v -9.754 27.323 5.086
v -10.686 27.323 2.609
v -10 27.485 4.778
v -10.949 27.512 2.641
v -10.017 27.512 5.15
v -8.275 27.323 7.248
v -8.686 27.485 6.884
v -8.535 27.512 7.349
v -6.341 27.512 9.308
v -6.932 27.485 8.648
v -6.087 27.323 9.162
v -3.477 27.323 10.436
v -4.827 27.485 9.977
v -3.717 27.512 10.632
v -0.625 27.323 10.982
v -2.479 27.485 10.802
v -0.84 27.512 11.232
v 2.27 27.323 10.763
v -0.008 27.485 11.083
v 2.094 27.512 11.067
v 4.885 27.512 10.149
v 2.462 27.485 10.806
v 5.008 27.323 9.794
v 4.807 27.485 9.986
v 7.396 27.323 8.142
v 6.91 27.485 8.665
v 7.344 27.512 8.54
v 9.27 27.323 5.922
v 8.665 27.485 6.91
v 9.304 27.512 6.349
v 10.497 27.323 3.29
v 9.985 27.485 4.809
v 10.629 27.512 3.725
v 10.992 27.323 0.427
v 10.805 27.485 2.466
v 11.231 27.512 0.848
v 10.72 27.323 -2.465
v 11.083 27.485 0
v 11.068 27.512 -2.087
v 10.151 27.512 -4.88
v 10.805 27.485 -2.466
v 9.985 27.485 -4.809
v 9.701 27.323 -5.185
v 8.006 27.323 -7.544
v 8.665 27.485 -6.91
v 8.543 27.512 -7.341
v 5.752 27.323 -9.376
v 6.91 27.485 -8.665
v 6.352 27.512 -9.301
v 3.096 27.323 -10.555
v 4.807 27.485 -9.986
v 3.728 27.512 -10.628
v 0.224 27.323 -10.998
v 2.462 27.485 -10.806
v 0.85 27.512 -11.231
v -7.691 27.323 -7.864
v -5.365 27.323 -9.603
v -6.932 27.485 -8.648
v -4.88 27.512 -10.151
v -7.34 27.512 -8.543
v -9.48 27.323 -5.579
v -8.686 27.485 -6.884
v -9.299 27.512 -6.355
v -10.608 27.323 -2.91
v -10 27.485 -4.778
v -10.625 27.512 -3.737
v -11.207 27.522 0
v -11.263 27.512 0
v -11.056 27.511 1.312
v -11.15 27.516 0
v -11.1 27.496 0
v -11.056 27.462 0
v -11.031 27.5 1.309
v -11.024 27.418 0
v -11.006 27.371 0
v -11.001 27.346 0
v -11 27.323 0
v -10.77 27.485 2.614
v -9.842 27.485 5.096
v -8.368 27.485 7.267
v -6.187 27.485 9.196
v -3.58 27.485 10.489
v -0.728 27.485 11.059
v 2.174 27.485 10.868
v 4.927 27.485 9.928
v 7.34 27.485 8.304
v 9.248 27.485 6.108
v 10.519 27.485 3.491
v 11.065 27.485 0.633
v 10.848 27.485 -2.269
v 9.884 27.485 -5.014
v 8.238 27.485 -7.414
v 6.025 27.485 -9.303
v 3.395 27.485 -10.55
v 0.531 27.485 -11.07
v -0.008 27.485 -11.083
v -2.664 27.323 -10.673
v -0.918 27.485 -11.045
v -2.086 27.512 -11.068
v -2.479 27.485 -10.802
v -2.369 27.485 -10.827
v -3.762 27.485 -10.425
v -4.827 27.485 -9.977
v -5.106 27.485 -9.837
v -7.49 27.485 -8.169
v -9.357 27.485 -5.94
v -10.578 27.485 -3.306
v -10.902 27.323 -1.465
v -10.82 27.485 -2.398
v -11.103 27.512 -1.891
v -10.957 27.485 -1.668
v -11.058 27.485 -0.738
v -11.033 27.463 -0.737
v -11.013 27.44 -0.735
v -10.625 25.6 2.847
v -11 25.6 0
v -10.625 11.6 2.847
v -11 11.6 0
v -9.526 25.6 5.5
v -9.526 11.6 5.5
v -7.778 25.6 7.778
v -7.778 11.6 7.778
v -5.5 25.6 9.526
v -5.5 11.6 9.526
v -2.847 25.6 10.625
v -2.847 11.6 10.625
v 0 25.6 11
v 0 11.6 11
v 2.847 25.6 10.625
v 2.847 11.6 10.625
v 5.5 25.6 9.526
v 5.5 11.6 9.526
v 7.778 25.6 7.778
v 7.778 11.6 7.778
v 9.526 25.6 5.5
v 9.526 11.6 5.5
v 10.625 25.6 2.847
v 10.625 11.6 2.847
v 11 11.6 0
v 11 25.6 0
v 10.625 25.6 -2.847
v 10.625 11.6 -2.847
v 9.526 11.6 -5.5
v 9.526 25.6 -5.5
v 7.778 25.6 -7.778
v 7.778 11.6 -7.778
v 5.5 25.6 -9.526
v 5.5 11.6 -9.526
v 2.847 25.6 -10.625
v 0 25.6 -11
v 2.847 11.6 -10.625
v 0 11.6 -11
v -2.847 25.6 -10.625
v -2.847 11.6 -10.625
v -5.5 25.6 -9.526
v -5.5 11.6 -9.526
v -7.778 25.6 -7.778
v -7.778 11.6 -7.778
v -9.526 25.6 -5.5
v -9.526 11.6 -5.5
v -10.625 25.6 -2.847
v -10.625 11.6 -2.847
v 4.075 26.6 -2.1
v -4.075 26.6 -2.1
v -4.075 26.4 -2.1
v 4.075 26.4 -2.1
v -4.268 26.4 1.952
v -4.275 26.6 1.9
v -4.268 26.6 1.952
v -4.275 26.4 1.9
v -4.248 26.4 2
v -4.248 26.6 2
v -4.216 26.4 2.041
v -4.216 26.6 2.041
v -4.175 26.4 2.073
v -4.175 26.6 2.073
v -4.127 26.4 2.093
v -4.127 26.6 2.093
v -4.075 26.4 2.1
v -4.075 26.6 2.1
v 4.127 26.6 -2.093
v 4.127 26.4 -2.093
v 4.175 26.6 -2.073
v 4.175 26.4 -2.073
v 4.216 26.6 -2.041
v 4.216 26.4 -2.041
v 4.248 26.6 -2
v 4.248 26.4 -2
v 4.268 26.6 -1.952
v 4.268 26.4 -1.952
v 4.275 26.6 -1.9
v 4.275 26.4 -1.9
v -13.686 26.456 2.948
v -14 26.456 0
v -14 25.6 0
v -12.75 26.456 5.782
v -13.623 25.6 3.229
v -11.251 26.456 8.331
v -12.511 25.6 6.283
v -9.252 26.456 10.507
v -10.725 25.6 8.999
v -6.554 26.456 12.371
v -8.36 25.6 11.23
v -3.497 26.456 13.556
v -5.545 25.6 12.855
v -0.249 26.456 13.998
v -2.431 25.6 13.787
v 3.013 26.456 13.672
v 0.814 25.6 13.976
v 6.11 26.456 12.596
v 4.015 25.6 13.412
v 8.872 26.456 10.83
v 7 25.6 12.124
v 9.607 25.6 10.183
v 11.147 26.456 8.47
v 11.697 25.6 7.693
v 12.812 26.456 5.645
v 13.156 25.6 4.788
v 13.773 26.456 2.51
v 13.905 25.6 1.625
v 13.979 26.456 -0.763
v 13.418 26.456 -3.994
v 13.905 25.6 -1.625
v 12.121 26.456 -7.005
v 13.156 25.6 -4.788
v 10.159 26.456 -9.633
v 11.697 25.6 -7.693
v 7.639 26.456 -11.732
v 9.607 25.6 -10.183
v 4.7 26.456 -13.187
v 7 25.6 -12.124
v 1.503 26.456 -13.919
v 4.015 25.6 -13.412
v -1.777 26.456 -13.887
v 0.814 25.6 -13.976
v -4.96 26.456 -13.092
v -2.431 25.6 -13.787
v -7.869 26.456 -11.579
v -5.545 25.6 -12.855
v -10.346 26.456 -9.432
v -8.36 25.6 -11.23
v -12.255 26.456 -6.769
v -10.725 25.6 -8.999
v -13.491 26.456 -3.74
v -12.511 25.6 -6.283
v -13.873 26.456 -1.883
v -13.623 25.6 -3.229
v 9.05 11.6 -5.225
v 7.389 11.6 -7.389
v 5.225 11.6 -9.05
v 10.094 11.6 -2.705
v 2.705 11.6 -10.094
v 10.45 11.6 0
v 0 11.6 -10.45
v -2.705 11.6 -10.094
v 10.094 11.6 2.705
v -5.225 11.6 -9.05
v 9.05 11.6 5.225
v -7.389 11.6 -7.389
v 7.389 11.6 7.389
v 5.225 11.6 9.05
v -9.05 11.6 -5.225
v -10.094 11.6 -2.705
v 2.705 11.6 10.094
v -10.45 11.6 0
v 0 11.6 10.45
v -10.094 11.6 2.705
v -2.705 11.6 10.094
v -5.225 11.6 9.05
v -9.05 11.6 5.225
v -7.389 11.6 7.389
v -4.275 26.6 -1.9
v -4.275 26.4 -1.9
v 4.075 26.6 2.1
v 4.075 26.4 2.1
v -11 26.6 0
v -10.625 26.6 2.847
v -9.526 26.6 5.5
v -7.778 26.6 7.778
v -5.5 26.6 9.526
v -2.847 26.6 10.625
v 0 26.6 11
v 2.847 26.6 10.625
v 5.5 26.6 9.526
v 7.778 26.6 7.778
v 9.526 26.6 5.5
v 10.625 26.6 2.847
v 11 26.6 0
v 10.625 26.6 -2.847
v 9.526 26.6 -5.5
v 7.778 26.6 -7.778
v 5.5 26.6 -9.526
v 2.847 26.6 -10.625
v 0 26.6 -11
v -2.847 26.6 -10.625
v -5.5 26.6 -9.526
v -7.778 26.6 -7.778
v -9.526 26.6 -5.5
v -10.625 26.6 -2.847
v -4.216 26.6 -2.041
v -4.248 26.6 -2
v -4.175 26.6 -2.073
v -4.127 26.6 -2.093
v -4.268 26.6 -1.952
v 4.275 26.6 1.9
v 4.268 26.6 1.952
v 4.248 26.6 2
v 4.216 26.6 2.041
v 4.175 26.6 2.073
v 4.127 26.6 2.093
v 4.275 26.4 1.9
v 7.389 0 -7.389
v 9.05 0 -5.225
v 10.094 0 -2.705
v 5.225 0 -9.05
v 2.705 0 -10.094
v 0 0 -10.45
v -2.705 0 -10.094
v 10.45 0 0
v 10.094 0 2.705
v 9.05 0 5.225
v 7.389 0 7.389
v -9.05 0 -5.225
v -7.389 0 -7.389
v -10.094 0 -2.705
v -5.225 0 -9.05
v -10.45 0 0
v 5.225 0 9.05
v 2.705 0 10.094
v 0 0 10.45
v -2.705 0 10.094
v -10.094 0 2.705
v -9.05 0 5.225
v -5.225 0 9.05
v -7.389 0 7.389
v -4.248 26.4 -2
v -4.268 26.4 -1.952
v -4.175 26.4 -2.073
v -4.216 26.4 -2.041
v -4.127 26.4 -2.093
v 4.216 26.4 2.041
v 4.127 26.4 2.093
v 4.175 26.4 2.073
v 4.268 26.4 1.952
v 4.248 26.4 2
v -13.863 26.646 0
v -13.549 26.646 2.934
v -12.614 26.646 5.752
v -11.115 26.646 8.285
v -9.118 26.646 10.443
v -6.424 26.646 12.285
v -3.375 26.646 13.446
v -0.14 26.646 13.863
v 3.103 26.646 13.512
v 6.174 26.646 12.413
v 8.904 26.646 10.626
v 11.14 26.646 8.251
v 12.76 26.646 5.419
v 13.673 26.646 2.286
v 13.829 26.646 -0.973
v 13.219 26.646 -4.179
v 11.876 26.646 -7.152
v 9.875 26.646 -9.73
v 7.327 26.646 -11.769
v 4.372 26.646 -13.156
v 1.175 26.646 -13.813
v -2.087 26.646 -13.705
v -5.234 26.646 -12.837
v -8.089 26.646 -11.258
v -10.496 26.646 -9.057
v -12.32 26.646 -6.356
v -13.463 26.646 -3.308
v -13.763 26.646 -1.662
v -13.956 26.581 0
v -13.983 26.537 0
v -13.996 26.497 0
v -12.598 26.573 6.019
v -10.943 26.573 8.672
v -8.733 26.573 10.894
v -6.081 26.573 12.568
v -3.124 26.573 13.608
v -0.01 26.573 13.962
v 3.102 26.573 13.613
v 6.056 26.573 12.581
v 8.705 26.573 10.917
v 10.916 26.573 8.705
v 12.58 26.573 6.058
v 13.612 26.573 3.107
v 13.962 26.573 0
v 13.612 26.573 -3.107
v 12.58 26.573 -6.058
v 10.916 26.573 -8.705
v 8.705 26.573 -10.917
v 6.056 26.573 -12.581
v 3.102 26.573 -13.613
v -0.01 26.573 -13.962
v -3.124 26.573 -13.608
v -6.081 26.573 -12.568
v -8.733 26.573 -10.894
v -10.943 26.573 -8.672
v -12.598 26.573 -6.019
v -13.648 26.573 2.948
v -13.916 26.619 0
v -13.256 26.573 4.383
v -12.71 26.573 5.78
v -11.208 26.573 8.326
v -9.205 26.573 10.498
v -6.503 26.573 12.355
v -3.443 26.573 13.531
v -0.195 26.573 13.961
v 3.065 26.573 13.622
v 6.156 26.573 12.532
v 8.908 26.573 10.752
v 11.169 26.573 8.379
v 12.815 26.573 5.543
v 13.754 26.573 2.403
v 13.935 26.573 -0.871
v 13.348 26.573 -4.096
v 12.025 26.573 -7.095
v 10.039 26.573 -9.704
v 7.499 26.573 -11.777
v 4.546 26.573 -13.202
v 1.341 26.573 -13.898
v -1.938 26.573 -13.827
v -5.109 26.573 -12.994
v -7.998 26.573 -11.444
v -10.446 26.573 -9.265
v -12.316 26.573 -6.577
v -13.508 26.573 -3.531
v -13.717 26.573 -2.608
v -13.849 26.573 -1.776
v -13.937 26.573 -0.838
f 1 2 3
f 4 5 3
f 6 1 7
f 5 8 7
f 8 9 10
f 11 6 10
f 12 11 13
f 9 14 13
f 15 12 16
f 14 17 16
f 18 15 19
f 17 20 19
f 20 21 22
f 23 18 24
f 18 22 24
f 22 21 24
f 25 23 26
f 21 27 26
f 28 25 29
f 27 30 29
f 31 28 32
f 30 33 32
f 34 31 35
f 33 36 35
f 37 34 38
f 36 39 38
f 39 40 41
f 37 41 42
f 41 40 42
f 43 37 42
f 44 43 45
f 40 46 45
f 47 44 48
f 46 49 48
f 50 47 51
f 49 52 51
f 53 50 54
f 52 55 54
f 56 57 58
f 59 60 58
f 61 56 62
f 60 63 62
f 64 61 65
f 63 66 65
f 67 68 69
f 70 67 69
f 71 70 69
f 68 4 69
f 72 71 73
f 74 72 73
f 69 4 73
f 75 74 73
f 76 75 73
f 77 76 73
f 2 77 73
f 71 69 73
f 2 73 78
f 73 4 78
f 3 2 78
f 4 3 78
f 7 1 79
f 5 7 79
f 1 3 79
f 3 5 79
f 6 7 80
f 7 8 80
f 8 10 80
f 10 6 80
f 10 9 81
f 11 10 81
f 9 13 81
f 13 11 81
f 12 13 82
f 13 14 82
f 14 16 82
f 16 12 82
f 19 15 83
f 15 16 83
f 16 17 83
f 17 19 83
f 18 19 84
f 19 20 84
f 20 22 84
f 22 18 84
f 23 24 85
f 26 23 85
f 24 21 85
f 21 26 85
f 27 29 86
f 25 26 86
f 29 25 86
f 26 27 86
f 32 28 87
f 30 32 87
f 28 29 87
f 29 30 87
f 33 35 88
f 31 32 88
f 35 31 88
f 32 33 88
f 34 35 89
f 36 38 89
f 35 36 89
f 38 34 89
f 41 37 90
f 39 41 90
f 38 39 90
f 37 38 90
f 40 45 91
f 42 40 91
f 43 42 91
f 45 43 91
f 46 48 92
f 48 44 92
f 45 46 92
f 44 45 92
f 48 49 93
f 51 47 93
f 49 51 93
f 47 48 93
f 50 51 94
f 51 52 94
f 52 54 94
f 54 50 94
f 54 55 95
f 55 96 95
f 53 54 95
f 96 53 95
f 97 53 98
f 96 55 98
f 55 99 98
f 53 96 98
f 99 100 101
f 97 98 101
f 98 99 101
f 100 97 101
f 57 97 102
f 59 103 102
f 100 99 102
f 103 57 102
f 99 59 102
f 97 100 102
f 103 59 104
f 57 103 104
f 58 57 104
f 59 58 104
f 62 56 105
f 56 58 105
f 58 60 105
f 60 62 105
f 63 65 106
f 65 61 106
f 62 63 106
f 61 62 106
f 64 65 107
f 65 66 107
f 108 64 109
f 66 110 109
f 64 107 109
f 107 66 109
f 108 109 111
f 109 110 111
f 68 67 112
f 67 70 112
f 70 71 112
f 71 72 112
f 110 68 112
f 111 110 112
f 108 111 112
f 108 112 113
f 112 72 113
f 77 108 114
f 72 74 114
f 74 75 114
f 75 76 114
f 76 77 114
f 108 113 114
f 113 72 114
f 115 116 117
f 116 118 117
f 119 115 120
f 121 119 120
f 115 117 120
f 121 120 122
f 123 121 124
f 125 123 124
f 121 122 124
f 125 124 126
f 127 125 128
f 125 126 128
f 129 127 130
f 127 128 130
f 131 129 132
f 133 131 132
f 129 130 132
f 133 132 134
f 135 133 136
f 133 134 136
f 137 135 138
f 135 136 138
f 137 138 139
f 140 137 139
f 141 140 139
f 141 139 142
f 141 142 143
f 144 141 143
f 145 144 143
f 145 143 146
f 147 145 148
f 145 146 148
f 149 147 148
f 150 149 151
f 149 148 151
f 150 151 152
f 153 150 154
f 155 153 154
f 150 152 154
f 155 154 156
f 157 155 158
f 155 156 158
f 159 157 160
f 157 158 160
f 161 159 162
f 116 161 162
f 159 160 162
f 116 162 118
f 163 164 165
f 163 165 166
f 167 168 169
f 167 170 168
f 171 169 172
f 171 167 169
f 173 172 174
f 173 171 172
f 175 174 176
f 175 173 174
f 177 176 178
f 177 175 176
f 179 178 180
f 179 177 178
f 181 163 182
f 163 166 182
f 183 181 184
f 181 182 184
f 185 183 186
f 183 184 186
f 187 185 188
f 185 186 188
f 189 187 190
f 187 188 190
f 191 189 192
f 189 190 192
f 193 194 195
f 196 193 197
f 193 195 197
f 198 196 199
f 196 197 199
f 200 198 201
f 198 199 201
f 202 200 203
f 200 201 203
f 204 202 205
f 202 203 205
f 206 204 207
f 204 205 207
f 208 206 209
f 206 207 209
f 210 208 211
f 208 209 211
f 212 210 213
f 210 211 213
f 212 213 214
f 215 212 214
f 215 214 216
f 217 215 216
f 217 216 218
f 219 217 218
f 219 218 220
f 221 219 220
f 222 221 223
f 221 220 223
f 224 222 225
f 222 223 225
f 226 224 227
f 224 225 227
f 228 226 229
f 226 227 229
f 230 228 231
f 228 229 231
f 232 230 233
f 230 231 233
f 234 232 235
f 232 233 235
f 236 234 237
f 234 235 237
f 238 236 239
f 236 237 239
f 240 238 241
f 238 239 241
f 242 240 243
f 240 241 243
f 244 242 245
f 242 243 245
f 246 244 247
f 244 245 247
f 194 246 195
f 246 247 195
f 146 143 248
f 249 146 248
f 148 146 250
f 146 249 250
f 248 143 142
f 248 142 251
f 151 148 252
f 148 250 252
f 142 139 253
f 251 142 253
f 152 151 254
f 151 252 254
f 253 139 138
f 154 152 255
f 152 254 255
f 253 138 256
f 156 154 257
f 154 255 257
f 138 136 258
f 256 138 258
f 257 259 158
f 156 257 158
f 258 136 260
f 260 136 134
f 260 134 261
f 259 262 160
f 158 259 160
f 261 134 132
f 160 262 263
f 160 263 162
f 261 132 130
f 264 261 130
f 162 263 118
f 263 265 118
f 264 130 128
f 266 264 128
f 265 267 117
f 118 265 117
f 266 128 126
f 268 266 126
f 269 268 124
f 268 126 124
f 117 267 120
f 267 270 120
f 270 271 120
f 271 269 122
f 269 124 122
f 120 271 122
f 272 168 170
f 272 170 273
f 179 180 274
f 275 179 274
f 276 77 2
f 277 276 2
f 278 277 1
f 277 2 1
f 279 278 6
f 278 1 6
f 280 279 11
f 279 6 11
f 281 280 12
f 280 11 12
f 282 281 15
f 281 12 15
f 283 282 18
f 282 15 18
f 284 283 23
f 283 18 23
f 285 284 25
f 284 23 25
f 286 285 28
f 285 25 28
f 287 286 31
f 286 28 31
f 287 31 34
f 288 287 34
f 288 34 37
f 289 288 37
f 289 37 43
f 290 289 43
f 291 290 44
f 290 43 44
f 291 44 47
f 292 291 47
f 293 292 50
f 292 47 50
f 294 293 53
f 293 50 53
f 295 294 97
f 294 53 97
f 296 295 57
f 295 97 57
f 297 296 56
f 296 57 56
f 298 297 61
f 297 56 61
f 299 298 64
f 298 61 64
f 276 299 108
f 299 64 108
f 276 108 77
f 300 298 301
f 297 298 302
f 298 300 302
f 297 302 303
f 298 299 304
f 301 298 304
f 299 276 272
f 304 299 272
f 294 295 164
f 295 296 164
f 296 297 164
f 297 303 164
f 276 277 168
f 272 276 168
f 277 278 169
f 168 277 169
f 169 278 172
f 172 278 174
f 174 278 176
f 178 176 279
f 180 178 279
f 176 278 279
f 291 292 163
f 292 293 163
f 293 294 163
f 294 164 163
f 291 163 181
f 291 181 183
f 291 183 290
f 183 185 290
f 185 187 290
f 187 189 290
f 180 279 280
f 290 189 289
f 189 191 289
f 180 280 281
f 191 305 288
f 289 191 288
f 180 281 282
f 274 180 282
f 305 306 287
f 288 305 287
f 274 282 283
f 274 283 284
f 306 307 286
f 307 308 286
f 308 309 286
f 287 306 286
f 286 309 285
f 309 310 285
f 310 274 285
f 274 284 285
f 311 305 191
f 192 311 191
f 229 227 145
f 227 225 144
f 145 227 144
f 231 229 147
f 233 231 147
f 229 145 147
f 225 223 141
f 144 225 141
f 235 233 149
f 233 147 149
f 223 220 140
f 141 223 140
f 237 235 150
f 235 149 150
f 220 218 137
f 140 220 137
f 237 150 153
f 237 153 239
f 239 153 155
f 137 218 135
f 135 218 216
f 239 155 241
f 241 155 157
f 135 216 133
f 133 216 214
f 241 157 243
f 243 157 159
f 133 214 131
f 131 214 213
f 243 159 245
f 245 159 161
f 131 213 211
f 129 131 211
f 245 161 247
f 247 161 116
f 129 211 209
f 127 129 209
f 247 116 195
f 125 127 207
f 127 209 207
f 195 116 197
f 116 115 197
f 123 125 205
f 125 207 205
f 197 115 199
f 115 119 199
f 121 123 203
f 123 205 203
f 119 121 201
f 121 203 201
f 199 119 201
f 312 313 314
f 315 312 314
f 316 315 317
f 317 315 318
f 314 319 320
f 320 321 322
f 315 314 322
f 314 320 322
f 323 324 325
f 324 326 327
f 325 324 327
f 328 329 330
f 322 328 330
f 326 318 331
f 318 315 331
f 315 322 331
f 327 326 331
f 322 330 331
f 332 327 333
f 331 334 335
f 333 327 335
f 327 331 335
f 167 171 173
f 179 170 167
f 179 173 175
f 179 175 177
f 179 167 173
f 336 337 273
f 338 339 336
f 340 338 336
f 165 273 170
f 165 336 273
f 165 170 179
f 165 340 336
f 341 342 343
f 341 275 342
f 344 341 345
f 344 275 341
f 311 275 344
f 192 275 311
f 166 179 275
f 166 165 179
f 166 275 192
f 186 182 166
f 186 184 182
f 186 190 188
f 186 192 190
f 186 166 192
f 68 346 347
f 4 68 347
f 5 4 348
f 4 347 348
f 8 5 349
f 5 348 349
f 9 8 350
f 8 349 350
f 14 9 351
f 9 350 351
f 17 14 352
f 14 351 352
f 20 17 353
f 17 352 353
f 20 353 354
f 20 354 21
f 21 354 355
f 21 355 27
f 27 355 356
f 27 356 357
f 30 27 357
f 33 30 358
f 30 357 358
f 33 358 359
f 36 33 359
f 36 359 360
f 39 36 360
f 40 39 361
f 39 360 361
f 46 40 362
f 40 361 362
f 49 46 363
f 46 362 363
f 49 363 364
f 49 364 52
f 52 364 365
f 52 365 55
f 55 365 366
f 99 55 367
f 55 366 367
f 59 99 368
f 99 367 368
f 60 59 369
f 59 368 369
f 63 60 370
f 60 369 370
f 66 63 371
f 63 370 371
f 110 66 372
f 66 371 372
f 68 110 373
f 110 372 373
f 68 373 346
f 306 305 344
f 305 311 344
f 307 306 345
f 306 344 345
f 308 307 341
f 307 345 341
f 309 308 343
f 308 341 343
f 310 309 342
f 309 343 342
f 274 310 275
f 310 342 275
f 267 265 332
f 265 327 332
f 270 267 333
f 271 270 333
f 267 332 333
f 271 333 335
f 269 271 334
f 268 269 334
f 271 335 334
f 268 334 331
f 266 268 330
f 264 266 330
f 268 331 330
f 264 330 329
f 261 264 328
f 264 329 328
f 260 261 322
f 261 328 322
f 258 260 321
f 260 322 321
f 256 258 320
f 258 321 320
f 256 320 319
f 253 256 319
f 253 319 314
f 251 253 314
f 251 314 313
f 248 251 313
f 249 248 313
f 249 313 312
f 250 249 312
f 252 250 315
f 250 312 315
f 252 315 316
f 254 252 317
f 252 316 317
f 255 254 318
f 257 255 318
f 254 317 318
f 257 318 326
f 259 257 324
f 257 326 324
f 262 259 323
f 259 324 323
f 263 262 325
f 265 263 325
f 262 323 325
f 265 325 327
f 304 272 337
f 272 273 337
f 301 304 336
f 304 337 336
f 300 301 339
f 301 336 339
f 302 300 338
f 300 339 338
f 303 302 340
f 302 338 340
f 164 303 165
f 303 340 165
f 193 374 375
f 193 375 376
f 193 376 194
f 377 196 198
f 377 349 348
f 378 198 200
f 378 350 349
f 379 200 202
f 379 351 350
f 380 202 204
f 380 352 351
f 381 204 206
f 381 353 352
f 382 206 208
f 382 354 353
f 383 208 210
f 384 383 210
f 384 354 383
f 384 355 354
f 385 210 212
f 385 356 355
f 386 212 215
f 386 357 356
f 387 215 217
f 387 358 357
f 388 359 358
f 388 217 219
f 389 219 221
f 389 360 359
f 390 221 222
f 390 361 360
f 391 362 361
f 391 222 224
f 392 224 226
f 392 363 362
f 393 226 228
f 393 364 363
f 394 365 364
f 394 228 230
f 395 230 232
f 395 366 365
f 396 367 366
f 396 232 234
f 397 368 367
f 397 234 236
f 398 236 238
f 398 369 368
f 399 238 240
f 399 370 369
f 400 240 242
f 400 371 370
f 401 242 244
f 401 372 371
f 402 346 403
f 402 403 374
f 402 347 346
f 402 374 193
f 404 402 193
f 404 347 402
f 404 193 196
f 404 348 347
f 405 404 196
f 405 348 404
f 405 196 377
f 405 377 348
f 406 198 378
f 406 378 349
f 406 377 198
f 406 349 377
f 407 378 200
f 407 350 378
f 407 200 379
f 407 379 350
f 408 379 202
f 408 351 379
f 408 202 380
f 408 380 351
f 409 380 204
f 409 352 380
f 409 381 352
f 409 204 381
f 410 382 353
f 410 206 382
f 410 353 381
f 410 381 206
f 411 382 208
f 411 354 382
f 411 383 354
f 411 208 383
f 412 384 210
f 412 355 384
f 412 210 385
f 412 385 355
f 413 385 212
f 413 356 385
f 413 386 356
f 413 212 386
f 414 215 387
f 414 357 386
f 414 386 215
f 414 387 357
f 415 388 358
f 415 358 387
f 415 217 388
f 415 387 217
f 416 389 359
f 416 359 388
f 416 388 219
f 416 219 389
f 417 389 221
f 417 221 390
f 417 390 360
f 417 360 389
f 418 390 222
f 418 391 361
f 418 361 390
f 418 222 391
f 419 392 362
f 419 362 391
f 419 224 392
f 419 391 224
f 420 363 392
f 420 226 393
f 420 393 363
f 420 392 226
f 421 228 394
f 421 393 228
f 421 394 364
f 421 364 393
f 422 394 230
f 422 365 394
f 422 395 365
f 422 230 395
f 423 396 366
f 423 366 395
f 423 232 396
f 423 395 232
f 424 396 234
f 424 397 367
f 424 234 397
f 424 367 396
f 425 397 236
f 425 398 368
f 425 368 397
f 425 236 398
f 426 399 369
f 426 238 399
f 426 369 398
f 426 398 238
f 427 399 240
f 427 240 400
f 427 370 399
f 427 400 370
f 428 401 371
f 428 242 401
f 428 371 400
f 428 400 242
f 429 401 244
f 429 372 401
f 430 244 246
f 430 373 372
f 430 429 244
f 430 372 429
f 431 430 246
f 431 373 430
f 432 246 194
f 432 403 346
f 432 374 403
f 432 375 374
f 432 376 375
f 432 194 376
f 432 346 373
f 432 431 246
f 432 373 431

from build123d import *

# Parameters (mm, degrees)
FILLET1_R          = 0.2
SKETCH2_W          = 8.55
SKETCH2_H          = 4.2
CUT_EXTRUDE1_DEPTH = 0.2
FILLET2_R          = 0.2


with BuildPart() as part:
    # Sketch1 → Revolve1 (revolve)
    with BuildSketch(Plane.XY):
        Polygon((-11, 27.6), (-14, 26.6), (-14, 25.6), (-11, 25.6), (-11, 11.6), (-10.45, 11.6), (-10.45, 0), (0, 0), (0, 26.6), (-11, 26.6), align=None)
    revolve(axis=Axis((0, 0, 0), (0, 1, 0)))

    # Fillet1
    fillet1_edges = [part.edges().sort_by_distance(p)[0] for p in [
        (11, 27.6, 0),
        (14, 26.6, 0),
    ]]
    fillet(fillet1_edges, radius=FILLET1_R)

    # Sketch2 → Cut-Extrude1 (cut)
    with BuildSketch(Plane(origin=(0, 26.6, 0), x_dir=(1, 0, 0), z_dir=(0, 1, 0))):
        Rectangle(SKETCH2_W, SKETCH2_H)
    extrude(amount=-CUT_EXTRUDE1_DEPTH, mode=Mode.SUBTRACT)

    # Fillet2
    fillet2_edges = [part.edges().sort_by_distance(p)[0] for p in [
        (4.275, 26.5, 2.1),
        (-4.275, 26.5, 2.1),
        (-4.275, 26.5, -2.1),
        (4.275, 26.5, -2.1),
    ]]
    fillet(fillet2_edges, radius=FILLET2_R)


solid = part.part
